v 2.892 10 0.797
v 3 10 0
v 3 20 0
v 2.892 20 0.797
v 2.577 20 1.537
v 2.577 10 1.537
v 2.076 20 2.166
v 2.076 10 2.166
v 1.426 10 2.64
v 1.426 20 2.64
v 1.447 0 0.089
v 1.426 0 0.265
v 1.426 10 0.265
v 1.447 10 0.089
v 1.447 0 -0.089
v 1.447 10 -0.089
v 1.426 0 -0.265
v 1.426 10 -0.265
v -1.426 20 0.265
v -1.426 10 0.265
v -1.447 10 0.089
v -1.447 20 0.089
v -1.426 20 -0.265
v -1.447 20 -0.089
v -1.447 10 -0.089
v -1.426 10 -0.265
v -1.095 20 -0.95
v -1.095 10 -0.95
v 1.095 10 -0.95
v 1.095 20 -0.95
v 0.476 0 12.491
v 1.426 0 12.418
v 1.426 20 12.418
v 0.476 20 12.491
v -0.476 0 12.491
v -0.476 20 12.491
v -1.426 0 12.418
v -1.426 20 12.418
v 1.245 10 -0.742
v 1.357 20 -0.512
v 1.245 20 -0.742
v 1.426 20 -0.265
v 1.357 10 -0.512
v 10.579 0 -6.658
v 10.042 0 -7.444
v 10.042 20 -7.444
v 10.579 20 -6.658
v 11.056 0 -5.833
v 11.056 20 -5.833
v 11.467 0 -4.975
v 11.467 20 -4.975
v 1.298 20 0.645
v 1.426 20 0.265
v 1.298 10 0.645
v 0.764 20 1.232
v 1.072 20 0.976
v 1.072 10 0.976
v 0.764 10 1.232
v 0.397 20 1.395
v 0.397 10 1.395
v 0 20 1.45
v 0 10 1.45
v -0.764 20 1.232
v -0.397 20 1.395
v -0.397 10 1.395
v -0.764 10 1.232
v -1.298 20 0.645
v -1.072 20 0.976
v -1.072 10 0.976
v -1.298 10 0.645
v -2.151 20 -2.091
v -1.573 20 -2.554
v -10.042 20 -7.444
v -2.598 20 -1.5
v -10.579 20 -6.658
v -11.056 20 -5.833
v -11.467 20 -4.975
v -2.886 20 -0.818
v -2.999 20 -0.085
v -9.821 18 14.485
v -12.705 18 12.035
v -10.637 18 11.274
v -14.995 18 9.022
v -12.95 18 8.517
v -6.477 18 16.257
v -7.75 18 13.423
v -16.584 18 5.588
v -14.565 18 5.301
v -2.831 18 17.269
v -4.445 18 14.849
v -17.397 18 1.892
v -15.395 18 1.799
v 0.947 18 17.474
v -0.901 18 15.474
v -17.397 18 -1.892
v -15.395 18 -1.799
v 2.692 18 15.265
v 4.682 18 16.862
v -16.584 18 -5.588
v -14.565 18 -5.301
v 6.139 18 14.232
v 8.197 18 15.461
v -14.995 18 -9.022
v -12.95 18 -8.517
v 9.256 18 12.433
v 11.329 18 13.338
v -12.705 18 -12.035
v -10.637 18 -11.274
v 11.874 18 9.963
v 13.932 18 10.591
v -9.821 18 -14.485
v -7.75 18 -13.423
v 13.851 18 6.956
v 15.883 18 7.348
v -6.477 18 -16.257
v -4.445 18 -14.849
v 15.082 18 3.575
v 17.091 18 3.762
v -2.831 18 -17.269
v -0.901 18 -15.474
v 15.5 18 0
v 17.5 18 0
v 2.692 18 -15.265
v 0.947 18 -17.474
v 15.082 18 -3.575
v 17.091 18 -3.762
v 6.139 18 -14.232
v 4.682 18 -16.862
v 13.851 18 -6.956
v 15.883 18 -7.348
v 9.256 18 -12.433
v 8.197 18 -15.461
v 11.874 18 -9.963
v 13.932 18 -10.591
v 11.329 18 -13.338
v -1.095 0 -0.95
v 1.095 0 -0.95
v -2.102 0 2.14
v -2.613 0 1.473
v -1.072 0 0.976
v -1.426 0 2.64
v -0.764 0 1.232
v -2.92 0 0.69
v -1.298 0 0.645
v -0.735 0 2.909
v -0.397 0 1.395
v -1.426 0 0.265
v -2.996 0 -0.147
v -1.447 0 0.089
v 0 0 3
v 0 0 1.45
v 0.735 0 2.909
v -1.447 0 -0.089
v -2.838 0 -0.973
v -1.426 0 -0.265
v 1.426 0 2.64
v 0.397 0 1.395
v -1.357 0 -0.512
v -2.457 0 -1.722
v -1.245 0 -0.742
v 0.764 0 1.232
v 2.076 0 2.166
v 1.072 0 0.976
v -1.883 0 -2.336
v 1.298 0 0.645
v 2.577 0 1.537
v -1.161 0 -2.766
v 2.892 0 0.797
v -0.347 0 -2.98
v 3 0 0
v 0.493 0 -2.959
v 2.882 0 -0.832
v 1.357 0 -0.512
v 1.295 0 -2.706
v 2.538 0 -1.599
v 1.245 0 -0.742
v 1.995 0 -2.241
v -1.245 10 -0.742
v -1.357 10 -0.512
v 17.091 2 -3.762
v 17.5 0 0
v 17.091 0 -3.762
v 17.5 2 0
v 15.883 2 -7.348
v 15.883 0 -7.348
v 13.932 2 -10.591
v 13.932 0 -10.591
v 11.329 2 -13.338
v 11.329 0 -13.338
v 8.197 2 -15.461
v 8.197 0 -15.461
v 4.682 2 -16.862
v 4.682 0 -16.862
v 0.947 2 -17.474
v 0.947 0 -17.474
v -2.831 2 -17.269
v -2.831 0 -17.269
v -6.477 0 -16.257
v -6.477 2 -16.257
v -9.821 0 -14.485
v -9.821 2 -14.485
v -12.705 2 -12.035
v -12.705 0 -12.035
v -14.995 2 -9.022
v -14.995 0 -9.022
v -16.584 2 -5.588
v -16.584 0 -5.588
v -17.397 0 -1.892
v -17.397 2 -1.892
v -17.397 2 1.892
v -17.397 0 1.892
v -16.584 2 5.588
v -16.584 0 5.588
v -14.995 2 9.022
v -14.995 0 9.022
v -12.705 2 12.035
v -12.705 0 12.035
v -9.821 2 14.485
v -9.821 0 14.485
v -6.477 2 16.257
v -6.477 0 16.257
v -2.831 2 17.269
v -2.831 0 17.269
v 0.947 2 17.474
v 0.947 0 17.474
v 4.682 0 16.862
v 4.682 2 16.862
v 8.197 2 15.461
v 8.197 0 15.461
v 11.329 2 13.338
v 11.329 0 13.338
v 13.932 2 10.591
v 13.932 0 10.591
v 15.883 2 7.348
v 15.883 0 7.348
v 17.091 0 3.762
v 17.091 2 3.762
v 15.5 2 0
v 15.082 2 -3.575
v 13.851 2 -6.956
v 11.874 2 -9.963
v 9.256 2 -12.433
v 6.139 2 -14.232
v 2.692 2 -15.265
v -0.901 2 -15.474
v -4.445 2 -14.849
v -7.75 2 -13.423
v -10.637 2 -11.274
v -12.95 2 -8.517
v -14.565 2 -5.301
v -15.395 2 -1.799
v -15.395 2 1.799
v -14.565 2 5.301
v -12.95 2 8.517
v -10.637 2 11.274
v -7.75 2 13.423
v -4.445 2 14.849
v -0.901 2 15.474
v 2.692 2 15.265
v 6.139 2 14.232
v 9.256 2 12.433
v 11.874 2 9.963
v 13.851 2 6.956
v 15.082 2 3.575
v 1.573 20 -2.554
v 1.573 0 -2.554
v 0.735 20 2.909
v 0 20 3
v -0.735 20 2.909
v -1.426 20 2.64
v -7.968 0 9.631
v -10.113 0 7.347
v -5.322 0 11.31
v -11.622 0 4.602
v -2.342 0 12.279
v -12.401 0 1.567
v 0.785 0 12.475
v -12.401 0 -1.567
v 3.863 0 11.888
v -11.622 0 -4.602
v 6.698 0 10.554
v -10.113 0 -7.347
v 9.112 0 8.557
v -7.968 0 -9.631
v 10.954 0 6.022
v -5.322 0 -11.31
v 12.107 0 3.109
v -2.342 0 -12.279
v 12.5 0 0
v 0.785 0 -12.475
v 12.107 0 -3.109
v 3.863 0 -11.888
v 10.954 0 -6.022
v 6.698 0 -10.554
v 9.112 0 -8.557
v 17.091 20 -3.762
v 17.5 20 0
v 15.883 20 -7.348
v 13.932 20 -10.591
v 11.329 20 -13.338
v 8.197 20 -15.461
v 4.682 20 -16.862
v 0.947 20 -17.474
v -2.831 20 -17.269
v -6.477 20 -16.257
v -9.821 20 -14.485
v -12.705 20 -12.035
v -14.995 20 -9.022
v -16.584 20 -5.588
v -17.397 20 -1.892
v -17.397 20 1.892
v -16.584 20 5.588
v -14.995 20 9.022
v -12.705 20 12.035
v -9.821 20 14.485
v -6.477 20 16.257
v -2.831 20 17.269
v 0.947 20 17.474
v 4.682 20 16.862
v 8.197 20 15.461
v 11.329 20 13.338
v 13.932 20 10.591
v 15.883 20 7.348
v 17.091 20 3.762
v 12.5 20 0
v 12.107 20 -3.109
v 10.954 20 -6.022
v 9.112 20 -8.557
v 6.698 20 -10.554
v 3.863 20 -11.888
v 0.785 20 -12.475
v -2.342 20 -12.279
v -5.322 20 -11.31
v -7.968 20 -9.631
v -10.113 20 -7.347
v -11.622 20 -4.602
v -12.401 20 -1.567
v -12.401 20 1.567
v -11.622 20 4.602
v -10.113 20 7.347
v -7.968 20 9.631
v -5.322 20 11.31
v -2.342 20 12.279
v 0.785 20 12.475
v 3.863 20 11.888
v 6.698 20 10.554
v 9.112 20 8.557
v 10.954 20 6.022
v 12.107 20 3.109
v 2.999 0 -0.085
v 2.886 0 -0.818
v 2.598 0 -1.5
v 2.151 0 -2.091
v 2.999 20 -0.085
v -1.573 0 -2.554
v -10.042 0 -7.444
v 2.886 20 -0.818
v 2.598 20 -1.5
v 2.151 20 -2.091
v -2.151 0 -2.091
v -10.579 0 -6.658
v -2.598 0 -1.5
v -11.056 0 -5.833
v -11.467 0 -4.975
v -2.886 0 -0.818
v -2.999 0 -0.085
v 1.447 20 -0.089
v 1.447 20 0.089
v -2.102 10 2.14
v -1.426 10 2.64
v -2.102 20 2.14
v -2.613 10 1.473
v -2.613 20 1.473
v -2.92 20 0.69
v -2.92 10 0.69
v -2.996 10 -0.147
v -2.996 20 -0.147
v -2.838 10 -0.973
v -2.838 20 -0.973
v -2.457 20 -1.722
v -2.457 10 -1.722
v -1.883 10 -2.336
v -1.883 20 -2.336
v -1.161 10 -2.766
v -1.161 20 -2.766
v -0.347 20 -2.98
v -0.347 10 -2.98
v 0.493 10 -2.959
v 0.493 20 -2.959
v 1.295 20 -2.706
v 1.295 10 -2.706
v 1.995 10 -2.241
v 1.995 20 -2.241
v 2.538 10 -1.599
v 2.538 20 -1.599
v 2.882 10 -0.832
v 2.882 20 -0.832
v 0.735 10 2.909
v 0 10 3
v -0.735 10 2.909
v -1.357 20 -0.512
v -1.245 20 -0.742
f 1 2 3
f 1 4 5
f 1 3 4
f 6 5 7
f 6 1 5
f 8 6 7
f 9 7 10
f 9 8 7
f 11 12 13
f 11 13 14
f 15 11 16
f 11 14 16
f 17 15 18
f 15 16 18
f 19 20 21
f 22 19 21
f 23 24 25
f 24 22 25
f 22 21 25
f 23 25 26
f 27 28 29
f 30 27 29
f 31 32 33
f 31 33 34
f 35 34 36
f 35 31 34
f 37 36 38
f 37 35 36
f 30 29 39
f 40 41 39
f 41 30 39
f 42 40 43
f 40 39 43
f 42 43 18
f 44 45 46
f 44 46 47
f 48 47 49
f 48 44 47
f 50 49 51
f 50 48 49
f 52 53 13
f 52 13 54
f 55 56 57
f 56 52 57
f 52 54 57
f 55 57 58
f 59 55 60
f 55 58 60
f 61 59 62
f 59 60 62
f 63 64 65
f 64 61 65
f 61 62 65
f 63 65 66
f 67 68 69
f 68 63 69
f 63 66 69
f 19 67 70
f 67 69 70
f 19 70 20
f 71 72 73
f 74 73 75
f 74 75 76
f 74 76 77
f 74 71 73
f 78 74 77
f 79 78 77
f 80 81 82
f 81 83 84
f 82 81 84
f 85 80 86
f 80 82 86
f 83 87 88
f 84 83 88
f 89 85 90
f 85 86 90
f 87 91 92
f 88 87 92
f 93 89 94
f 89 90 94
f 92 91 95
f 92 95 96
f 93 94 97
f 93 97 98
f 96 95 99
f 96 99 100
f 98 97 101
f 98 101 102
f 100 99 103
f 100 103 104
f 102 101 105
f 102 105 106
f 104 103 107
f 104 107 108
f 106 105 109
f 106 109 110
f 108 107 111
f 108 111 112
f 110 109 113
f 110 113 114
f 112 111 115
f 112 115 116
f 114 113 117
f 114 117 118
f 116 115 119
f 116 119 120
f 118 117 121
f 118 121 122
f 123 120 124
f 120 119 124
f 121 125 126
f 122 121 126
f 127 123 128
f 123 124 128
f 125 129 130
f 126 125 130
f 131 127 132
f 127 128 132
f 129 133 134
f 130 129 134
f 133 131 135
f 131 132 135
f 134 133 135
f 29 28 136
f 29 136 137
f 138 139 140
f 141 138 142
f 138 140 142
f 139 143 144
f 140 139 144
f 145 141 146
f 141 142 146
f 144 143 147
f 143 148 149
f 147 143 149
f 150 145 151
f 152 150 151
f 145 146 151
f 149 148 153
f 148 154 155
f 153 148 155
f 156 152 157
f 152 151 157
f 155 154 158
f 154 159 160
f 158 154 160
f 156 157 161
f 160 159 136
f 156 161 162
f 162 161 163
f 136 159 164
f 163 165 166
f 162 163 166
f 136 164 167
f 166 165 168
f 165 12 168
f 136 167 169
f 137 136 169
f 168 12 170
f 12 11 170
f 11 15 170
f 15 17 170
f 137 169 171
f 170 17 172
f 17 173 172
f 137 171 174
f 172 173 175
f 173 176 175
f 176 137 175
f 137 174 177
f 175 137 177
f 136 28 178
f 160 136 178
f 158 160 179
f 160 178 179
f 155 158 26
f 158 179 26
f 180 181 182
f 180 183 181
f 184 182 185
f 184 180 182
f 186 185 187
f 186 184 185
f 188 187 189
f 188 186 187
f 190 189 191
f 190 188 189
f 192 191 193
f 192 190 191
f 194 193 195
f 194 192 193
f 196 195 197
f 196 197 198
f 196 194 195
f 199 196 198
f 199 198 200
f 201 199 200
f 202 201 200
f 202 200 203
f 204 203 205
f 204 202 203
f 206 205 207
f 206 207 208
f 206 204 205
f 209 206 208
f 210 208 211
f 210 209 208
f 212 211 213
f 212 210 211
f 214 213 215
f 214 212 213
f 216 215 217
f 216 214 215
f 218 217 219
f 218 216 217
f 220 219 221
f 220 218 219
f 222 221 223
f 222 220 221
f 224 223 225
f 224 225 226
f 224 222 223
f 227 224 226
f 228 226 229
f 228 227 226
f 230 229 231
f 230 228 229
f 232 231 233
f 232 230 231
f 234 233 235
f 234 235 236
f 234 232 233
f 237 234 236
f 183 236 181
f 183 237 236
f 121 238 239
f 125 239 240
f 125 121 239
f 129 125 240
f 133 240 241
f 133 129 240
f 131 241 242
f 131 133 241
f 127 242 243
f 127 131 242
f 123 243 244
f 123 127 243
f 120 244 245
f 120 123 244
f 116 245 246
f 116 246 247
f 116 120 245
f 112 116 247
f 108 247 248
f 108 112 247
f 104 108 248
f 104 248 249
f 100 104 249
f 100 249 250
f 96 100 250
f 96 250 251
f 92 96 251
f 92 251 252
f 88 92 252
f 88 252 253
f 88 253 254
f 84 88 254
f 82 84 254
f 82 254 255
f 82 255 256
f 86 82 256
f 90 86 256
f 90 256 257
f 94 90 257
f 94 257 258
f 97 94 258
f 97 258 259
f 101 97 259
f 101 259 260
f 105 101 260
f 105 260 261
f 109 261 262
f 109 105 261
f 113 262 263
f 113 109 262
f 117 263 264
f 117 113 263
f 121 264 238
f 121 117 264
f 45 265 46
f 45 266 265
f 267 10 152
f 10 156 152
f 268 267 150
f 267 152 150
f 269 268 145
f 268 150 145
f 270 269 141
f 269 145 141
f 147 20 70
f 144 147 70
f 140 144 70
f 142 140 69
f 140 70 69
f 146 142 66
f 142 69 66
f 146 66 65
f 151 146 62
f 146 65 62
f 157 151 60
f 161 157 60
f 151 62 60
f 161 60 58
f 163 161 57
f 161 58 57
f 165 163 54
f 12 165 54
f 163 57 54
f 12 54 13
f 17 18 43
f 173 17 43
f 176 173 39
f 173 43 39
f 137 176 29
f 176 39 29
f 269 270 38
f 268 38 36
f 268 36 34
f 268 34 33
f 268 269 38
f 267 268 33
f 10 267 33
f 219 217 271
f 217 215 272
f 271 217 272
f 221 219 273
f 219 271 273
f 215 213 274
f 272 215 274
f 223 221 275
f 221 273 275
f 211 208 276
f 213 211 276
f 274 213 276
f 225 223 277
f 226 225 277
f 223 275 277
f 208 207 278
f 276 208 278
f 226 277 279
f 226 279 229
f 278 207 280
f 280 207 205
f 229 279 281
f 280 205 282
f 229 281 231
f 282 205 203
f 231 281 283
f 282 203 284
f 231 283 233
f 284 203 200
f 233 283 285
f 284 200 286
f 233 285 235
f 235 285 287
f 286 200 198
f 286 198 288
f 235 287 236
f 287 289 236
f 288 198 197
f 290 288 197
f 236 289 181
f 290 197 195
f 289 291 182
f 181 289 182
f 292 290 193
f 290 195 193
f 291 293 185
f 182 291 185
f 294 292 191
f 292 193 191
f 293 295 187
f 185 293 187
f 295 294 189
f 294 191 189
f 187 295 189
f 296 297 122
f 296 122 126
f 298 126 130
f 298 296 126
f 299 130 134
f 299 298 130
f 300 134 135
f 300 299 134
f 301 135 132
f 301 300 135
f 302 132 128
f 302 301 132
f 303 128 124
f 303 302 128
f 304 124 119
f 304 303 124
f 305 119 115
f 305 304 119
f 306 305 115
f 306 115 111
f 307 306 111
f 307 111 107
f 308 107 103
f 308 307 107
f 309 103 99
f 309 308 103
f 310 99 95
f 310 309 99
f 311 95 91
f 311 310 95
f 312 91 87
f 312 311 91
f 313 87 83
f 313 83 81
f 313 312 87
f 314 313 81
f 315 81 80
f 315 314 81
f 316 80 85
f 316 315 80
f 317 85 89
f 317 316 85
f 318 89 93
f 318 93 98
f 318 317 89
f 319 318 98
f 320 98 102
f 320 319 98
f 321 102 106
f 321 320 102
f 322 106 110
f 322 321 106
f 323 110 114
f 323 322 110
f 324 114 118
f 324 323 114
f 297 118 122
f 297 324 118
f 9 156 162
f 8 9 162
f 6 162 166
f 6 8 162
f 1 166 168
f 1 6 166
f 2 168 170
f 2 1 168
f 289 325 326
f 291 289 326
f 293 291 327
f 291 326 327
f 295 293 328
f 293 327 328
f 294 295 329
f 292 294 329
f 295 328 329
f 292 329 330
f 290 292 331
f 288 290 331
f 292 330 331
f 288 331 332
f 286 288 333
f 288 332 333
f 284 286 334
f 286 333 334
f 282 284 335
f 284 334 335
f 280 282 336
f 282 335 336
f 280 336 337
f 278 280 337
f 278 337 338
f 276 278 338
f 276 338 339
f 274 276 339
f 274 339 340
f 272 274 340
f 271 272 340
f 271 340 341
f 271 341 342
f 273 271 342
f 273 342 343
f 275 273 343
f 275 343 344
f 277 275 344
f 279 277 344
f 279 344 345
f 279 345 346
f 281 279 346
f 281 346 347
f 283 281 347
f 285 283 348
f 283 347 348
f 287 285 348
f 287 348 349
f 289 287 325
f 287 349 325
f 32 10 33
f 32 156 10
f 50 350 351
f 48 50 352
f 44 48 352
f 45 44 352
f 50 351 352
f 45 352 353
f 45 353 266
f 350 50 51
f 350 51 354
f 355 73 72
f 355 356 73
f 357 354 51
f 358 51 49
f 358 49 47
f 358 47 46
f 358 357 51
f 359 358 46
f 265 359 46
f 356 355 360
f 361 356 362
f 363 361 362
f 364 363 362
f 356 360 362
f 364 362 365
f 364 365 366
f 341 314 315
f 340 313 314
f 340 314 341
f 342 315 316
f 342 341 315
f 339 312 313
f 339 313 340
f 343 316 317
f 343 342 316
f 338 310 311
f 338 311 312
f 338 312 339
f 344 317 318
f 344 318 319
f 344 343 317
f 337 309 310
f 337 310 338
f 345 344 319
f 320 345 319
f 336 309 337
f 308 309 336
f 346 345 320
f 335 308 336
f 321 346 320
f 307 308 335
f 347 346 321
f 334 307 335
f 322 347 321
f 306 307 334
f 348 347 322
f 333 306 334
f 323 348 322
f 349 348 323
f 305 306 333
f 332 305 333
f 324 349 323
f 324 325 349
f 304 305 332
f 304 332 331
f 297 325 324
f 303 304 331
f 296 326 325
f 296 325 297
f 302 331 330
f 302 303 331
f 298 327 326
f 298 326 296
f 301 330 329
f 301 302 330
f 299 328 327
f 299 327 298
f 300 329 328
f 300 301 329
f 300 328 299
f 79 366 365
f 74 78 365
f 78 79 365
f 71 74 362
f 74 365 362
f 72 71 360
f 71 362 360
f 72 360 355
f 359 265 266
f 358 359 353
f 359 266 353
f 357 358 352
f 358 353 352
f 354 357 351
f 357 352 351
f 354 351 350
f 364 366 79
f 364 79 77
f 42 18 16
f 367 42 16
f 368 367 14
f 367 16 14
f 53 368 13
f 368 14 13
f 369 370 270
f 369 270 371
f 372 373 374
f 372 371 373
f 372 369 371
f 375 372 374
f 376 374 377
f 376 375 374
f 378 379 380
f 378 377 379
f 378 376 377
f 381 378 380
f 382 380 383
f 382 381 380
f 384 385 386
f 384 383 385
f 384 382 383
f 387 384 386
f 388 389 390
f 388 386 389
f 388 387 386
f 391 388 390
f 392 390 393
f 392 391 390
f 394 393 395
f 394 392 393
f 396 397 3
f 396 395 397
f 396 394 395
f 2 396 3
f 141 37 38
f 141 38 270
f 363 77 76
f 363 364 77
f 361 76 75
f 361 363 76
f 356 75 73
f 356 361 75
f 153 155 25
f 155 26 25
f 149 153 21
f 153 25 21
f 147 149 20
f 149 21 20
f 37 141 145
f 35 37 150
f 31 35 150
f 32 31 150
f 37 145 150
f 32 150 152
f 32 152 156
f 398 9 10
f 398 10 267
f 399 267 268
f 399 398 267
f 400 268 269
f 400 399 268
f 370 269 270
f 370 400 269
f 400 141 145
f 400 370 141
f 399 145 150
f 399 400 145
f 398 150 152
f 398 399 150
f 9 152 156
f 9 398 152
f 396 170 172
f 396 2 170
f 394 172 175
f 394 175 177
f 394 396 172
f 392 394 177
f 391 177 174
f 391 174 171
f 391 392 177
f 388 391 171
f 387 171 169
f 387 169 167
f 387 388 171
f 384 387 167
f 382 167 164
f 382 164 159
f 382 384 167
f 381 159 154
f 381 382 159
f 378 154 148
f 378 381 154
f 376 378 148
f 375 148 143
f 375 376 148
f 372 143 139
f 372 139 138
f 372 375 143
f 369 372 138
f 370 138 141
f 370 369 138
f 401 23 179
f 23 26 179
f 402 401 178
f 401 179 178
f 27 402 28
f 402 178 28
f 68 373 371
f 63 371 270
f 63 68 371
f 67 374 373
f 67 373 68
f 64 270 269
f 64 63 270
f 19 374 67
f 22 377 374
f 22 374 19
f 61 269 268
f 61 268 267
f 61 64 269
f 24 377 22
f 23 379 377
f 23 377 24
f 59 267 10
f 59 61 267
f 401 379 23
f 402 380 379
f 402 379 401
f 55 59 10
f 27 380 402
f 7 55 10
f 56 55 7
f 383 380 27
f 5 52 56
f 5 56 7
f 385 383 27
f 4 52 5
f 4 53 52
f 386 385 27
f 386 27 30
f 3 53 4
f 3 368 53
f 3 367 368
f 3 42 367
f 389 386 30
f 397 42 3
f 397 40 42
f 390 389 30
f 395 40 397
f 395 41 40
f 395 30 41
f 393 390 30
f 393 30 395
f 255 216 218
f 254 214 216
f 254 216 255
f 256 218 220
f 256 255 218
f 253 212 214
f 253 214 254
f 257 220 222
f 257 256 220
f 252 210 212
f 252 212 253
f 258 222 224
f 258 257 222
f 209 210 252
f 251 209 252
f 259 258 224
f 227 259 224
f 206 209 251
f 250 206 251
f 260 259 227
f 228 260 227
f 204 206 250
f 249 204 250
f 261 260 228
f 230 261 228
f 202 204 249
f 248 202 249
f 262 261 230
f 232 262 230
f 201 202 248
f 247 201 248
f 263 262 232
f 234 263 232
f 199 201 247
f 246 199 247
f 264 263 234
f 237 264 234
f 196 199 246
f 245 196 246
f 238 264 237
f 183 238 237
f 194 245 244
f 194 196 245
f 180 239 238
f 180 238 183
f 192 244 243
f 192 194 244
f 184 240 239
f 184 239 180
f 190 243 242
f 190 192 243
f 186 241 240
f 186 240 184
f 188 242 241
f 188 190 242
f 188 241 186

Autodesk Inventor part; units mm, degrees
ref_plane "YZ Plane" through (0, 0, 0) normal (1, 0, 0) x (0, 1, 0)
ref_plane "XZ Plane" through (0, 0, 0) normal (0, 1, 0) x (-1, 0, 0)
sketch "Эскиз1" plane through (0, 0, 0) normal (0, 0, 1) x (1, 0, 0)
  line L0 (0, 0) -> (12.5, 0) construction
  line L1 (12.5, 0) -> (12.5, 20)
  line L2 (12.5, 20) -> (17.5, 20)
  line L3 (17.5, 0) -> (17.5, 20)
  line L4 (12.5, 0) -> (17.5, 0)
  line L5 (0, -4) -> (0, 24) projected
  line L6 (17.5, 0) -> (17.5, 2)
  line L7 (17.5, 2) -> (15.5, 2)
  line L8 (15.5, 2) -> (15.5, 18)
  line L9 (15.5, 18) -> (17.5, 18)
  dimension "d0" = 12.5
  dimension "d1" = 20
  dimension "d2" = 5
  dimension "d21" = 2
  dimension "d22" = 2
revolve "Вращение1" add sketch "Эскиз1" angle 360 about axis through (0, -10, 0) along (0, 1, 0) contours L1 L2 L3 L9 L8 L7 L4
ref_plane "РабПлоскость1" through (0, 10, 0) normal (0, 1, 0) x (1, 0, 0)
sketch "Эскиз5" plane through (0, 10, 0) normal (0, 1, 0) x (1, 0, 0)
  arc A0 (-1.0954, 0.95) -> (1.0954, 0.95) centre (0, 0) ccw
  line L0 (-0.7485, 3.4889) -> (-0.7485, 5.8889)
  line L1 (-1.0954, 0.95) -> (1.0954, 0.95)
  circle A1 centre (0, 0) radius 3
  circle A2 centre (0, 0) radius 12.5 projected
  circle A3 centre (0, 0) radius 12.5 projected
  line L2 (0.1379, -2.9968) -> (1.4256, -12.4184) construction
  line L3 (-1.0015, -2.8279) -> (-1.2803, -12.4343) construction
  line L4 (-0.2687, 22.4233) -> (-0.1215, 22.4233)
  line L5 (1.4256, 0.265) -> (1.4256, -0.265)
  line L6 (1.4256, -2.6396) -> (1.4256, -12.4184)
  line L7 (-1.4256, -12.4184) -> (-1.4256, -2.6396)
  line L8 (-1.4256, -0.265) -> (-1.4256, 0.265)
  arc A4 (-1.4256, -2.6396) -> (1.4256, -2.6396) centre (0, 0) ccw
  arc A5 (-1.4256, -12.4184) -> (1.4256, -12.4184) centre (0, 0) ccw
  dimension "d18" = 2.9
  dimension "d19" = 2.4
  dimension "d20" = 6
extrude "Выдавливание5" add sketch "Эскиз5" along normal mid plane 20 separate body contours A1 L6 A2 L7 picked at (-0.6339, -9.3031)
pattern_circular "Круговой массив2" count 3 over 360 about axis through (0, -10, 0) along (0, 1, 0) of "Выдавливание5" bodies 2
extrude "Выдавливание6" add sketch "Эскиз5" along normal mid plane 20 contours A1 bodies 1
properties part number "Wheel"
